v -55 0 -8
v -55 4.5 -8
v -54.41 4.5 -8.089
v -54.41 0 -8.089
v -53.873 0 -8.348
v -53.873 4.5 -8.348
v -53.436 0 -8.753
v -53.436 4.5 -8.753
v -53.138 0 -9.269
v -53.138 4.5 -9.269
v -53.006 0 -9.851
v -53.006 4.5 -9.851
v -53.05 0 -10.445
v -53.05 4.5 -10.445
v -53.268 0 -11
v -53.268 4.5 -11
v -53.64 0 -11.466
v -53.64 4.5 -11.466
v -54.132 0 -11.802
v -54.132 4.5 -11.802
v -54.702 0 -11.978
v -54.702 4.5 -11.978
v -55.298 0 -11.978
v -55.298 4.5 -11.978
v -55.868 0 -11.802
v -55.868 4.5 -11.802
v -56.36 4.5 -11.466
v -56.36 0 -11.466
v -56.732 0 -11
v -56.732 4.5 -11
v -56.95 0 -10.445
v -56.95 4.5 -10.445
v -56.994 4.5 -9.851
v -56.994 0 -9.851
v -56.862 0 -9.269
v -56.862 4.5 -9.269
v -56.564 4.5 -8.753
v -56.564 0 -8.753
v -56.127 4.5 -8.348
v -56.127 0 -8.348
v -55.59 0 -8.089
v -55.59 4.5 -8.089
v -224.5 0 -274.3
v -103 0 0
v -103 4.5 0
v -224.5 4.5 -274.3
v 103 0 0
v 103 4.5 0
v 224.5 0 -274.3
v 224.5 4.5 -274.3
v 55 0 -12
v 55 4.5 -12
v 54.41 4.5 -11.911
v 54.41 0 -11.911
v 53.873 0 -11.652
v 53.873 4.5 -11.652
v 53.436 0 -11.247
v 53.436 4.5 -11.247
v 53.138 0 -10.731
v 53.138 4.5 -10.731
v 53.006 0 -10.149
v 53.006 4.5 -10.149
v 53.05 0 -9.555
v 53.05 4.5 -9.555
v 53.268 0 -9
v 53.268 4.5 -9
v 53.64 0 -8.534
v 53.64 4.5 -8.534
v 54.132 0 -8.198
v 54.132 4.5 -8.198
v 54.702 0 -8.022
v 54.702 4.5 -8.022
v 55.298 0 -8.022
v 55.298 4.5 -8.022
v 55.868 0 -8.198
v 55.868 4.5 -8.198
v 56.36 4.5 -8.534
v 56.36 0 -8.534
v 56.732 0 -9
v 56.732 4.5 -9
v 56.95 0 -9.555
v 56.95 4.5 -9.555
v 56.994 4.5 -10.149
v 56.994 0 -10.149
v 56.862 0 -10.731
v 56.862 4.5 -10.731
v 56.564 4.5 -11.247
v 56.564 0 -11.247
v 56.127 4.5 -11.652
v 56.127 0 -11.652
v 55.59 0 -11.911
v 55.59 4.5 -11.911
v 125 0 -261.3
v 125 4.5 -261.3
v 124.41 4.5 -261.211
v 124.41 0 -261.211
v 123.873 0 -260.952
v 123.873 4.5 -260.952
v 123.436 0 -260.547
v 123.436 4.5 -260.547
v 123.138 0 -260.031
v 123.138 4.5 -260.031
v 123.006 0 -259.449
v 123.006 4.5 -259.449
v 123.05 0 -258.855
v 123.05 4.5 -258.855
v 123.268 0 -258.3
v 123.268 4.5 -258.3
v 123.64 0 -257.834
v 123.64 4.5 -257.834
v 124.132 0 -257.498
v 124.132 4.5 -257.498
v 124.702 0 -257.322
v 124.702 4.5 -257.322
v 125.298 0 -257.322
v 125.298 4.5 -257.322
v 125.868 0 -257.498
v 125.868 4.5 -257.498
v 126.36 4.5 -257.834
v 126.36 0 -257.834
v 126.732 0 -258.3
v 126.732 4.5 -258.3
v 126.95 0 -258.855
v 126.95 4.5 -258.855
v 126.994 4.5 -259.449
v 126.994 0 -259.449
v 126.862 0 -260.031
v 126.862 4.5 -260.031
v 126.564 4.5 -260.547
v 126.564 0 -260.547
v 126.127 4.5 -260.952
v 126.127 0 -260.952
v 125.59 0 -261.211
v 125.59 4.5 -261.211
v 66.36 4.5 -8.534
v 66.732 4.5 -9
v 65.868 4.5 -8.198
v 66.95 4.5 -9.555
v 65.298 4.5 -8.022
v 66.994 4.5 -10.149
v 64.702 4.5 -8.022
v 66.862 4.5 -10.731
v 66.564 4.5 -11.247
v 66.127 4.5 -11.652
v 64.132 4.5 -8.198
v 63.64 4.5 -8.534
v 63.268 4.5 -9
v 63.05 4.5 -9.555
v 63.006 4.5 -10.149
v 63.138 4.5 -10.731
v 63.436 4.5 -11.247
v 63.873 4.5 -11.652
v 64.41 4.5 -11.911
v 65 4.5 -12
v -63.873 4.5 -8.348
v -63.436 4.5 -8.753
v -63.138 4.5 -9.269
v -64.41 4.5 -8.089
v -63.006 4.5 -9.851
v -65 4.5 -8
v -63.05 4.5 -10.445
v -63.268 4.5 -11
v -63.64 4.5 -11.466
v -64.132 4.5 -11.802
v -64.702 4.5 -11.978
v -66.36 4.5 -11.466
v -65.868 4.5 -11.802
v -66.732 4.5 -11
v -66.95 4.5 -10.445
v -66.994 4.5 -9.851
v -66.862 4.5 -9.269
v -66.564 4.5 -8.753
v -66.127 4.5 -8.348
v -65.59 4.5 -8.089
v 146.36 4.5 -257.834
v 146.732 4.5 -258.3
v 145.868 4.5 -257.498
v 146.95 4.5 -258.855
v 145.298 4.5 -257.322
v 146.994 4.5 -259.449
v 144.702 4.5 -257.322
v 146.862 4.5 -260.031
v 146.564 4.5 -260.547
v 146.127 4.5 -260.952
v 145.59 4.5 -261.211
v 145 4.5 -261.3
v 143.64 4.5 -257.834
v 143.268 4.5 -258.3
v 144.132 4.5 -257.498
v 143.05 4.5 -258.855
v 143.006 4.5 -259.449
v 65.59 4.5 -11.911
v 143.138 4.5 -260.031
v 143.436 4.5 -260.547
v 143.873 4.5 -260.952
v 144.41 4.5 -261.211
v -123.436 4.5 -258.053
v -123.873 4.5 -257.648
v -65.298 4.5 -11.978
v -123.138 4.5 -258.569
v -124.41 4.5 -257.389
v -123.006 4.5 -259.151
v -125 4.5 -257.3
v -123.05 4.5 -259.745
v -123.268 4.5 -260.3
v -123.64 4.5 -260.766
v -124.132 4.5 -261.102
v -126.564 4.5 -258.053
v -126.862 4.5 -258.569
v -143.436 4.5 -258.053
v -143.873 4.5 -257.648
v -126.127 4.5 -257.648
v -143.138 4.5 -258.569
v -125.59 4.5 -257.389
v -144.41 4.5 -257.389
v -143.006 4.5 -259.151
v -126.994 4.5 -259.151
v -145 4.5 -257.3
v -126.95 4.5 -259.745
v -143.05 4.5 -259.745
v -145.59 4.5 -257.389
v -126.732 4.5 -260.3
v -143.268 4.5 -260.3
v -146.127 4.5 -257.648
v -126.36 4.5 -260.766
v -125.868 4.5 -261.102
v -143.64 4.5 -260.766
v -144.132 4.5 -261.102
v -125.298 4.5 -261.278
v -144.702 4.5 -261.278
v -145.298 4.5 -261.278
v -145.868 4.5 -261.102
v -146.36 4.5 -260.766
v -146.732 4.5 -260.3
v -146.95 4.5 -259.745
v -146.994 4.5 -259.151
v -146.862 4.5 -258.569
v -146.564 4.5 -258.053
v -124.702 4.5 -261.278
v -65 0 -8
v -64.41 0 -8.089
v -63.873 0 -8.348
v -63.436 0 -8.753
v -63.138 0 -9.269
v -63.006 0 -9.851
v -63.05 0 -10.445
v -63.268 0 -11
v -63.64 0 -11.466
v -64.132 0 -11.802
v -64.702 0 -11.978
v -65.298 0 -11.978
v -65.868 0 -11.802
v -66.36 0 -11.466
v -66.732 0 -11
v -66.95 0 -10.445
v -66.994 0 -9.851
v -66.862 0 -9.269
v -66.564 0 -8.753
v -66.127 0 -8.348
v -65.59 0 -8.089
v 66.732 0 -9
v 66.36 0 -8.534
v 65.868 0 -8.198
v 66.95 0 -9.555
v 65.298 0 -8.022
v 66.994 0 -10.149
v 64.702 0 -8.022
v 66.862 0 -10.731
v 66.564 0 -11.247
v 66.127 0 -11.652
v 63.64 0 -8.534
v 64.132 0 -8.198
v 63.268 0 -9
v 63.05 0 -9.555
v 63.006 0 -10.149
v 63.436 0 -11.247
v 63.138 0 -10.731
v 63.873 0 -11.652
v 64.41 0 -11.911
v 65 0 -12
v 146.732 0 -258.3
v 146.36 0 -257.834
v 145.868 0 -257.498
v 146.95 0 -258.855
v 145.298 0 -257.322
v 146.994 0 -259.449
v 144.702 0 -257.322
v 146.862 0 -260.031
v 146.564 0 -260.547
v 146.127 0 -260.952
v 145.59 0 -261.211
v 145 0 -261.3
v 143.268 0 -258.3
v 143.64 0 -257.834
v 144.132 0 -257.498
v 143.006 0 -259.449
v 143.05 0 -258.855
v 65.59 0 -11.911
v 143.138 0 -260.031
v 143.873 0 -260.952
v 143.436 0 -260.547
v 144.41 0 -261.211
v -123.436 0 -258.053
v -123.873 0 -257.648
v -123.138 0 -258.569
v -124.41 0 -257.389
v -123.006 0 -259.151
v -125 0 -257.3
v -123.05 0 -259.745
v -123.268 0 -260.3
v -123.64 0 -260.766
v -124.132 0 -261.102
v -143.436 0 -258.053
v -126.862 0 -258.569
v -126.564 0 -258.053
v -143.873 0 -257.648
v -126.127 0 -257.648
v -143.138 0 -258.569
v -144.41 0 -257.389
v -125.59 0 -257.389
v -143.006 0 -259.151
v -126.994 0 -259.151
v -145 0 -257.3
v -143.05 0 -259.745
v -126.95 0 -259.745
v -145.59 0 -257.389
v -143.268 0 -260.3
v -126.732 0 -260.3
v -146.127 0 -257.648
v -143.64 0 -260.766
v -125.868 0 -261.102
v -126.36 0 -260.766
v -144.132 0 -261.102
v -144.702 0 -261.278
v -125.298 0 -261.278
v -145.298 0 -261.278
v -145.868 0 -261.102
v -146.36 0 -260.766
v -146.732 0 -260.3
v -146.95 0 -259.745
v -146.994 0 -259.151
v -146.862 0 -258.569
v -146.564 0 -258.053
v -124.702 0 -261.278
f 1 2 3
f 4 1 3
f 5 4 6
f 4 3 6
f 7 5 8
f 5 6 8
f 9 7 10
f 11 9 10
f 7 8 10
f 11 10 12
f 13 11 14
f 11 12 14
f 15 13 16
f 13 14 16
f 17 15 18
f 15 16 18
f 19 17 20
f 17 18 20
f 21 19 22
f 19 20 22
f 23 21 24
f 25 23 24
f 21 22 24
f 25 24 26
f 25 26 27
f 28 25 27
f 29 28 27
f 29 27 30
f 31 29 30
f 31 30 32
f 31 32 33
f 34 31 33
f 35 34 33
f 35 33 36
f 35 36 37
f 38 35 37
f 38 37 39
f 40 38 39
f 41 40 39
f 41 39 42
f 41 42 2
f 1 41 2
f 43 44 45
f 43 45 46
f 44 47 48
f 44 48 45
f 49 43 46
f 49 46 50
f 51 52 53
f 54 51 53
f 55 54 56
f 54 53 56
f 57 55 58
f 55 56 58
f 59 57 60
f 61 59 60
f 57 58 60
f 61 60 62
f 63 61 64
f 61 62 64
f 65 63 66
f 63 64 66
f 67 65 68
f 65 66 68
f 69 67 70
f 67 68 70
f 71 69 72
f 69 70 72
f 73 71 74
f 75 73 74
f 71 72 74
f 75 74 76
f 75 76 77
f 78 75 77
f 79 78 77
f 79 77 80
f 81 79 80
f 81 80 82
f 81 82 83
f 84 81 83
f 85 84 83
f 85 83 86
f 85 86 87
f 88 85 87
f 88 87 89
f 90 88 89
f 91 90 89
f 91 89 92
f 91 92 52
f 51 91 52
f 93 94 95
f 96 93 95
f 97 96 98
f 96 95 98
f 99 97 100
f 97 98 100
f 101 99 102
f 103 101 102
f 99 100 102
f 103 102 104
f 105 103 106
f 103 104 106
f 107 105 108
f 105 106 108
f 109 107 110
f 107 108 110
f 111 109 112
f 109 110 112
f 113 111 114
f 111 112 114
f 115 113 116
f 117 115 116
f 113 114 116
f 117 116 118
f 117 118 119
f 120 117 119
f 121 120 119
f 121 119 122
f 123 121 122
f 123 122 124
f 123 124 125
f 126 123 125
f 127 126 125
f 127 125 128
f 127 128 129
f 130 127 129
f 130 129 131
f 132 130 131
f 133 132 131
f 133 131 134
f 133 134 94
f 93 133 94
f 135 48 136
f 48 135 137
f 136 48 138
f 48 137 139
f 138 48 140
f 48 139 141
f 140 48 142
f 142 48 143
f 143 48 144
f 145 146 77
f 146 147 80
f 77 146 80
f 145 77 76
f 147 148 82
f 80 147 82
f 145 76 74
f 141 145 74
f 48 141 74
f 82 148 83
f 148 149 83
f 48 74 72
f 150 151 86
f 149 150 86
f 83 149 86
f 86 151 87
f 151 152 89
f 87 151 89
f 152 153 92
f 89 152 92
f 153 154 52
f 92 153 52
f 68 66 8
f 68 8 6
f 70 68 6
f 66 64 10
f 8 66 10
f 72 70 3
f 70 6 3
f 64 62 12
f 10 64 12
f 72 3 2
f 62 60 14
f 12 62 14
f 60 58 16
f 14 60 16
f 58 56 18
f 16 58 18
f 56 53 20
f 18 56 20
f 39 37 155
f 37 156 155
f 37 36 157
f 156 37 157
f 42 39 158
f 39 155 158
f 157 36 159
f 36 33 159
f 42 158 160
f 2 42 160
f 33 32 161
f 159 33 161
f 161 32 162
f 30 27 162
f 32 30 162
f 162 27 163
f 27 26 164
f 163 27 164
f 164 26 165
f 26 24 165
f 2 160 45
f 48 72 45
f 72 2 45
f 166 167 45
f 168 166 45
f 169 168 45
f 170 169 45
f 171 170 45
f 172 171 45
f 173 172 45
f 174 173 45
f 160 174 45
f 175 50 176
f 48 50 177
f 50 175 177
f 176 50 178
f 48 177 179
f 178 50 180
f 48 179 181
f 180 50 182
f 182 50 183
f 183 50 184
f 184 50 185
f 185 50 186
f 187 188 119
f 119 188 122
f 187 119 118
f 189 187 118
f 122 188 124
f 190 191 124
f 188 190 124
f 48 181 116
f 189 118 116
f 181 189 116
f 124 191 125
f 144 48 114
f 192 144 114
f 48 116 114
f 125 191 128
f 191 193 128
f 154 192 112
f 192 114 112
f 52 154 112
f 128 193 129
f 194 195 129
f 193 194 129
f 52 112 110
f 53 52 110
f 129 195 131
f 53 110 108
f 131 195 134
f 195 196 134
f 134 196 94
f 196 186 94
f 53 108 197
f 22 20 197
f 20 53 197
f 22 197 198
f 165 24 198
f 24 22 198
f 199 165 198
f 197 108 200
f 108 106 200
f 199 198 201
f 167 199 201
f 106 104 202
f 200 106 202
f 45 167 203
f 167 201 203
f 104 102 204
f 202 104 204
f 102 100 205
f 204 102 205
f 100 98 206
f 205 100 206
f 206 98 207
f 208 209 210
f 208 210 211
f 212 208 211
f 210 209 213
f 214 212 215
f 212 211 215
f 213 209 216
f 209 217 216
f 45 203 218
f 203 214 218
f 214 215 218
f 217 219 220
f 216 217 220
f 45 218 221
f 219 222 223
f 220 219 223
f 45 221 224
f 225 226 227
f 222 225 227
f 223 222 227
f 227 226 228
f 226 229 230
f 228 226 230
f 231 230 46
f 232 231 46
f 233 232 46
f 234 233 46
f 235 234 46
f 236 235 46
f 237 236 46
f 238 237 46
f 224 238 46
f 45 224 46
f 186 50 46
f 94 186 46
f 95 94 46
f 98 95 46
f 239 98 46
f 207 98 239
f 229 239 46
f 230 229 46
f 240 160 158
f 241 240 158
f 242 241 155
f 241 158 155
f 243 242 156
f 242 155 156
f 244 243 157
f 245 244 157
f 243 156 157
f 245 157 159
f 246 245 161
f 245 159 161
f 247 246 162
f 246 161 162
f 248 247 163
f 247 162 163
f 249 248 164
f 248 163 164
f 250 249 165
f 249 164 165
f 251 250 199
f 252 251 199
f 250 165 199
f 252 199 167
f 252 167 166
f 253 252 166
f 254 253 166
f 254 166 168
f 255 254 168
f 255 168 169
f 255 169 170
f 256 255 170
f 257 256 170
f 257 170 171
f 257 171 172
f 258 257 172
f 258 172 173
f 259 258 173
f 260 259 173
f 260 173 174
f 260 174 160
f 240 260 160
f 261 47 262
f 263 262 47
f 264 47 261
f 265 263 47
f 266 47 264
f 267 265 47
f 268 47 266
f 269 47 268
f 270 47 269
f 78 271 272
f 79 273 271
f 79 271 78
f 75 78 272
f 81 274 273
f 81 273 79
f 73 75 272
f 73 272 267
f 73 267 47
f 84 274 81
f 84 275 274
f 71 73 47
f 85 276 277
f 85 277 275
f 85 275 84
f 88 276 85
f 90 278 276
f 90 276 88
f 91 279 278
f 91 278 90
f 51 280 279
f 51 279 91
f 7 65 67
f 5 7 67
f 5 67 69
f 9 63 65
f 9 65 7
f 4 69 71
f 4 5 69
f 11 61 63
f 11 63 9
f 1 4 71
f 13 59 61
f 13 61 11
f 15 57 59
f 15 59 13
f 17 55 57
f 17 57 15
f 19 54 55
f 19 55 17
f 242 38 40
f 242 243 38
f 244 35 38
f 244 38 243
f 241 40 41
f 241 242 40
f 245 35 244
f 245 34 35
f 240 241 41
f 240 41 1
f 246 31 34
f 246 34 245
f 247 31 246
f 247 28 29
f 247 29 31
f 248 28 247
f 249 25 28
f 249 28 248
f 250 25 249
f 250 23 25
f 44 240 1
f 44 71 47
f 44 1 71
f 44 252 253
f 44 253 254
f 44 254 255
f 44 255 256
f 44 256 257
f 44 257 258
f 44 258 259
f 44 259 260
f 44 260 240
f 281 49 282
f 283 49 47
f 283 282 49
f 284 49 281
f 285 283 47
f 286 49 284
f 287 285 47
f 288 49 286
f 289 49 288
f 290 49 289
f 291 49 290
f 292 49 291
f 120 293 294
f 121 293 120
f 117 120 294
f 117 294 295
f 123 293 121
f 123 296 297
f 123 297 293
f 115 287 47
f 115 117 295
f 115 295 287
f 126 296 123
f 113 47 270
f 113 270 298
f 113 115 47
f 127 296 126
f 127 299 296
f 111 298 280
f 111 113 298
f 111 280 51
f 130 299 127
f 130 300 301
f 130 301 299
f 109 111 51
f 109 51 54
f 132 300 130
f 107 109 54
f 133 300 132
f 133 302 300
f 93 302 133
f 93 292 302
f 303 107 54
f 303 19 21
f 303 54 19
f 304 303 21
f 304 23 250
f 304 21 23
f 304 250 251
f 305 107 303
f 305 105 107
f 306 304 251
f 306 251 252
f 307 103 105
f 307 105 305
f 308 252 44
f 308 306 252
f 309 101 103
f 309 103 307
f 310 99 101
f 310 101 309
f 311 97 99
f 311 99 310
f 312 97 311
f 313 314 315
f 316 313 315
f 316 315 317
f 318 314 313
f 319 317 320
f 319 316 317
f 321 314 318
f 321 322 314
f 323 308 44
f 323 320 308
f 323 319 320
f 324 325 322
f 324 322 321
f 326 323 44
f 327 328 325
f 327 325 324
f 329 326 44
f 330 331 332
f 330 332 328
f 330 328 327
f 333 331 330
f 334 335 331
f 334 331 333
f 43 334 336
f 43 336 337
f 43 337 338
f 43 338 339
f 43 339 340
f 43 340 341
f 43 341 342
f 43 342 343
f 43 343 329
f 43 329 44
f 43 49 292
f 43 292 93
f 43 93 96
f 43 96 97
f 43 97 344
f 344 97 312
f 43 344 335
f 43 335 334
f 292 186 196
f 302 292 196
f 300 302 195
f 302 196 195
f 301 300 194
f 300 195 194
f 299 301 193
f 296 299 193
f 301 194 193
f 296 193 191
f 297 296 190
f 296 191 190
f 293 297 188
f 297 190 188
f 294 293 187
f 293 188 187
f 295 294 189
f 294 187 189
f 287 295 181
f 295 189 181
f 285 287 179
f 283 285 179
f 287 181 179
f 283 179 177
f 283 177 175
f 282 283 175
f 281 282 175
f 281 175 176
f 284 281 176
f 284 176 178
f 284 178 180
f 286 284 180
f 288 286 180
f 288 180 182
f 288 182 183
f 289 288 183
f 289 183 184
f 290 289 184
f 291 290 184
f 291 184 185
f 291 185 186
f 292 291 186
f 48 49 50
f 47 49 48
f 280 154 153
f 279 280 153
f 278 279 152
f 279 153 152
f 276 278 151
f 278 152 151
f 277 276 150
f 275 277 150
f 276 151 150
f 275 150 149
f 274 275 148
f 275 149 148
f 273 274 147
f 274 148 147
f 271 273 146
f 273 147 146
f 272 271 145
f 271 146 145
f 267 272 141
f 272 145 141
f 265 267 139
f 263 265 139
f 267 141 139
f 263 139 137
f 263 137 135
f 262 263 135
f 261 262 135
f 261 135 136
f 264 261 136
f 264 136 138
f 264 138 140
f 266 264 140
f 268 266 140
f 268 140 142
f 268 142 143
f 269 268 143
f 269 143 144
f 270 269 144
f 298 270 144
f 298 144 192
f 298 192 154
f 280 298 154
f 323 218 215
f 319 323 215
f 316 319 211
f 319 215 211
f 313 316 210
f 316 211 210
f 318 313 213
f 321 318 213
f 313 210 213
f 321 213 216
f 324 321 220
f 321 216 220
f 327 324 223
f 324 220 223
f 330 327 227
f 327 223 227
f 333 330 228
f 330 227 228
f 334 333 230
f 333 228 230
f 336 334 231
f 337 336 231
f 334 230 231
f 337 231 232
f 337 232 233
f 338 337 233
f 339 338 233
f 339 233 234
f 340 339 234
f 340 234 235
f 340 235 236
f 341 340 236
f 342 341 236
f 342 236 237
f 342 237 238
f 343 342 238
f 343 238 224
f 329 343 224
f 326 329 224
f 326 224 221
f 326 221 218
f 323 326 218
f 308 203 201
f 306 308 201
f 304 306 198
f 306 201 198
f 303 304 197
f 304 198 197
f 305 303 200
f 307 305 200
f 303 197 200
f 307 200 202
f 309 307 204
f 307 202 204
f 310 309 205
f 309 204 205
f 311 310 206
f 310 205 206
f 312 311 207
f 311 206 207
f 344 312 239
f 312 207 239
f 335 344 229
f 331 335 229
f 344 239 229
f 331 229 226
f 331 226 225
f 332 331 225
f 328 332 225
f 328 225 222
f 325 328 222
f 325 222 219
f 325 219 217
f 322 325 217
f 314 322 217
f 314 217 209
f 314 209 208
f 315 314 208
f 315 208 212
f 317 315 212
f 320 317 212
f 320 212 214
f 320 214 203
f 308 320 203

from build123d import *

# Parameters (mm, degrees)
EXTRUDE_1_DEPTH     = 4.5
SKETCH_3_R          = 2
CUT_EXTRUDE_1_DEPTH = 10


with BuildPart() as part:
    # 草图1 → 凸台-拉伸1 (new body)
    with BuildSketch(Plane(origin=(0, 0, 0), x_dir=(1, 0, 0), z_dir=(0, 1, 0))):
        Polygon((-224.5, 274.3), (224.5, 274.3), (103, 0), (-103, 0), align=None)
    extrude(amount=EXTRUDE_1_DEPTH)

    # 草图3 → 切除-拉伸1 (cut)
    with BuildSketch(Plane(origin=(0, 4.5, 0), x_dir=(1, 0, 0), z_dir=(0, 1, 0))):
        with Locations(Location((-145, 259.3, 0), (0, 0, 270))):
            Circle(SKETCH_3_R)
        with Locations(Location((-125, 259.3, 0), (0, 0, 270))):
            Circle(SKETCH_3_R)
        with Locations(Location((125, 259.3, 0), (0, 0, 90))):
            Circle(SKETCH_3_R)
        with Locations(Location((145, 259.3, 0), (0, 0, 90))):
            Circle(SKETCH_3_R)
        with Locations(Location((-65, 10, 0), (0, 0, 270))):
            Circle(SKETCH_3_R)
        with Locations(Location((-55, 10, 0), (0, 0, 270))):
            Circle(SKETCH_3_R)
        with Locations(Location((55, 10, 0), (0, 0, 90))):
            Circle(SKETCH_3_R)
        with Locations(Location((65, 10, 0), (0, 0, 90))):
            Circle(SKETCH_3_R)
    extrude(amount=-CUT_EXTRUDE_1_DEPTH, mode=Mode.SUBTRACT)


solid = part.part
